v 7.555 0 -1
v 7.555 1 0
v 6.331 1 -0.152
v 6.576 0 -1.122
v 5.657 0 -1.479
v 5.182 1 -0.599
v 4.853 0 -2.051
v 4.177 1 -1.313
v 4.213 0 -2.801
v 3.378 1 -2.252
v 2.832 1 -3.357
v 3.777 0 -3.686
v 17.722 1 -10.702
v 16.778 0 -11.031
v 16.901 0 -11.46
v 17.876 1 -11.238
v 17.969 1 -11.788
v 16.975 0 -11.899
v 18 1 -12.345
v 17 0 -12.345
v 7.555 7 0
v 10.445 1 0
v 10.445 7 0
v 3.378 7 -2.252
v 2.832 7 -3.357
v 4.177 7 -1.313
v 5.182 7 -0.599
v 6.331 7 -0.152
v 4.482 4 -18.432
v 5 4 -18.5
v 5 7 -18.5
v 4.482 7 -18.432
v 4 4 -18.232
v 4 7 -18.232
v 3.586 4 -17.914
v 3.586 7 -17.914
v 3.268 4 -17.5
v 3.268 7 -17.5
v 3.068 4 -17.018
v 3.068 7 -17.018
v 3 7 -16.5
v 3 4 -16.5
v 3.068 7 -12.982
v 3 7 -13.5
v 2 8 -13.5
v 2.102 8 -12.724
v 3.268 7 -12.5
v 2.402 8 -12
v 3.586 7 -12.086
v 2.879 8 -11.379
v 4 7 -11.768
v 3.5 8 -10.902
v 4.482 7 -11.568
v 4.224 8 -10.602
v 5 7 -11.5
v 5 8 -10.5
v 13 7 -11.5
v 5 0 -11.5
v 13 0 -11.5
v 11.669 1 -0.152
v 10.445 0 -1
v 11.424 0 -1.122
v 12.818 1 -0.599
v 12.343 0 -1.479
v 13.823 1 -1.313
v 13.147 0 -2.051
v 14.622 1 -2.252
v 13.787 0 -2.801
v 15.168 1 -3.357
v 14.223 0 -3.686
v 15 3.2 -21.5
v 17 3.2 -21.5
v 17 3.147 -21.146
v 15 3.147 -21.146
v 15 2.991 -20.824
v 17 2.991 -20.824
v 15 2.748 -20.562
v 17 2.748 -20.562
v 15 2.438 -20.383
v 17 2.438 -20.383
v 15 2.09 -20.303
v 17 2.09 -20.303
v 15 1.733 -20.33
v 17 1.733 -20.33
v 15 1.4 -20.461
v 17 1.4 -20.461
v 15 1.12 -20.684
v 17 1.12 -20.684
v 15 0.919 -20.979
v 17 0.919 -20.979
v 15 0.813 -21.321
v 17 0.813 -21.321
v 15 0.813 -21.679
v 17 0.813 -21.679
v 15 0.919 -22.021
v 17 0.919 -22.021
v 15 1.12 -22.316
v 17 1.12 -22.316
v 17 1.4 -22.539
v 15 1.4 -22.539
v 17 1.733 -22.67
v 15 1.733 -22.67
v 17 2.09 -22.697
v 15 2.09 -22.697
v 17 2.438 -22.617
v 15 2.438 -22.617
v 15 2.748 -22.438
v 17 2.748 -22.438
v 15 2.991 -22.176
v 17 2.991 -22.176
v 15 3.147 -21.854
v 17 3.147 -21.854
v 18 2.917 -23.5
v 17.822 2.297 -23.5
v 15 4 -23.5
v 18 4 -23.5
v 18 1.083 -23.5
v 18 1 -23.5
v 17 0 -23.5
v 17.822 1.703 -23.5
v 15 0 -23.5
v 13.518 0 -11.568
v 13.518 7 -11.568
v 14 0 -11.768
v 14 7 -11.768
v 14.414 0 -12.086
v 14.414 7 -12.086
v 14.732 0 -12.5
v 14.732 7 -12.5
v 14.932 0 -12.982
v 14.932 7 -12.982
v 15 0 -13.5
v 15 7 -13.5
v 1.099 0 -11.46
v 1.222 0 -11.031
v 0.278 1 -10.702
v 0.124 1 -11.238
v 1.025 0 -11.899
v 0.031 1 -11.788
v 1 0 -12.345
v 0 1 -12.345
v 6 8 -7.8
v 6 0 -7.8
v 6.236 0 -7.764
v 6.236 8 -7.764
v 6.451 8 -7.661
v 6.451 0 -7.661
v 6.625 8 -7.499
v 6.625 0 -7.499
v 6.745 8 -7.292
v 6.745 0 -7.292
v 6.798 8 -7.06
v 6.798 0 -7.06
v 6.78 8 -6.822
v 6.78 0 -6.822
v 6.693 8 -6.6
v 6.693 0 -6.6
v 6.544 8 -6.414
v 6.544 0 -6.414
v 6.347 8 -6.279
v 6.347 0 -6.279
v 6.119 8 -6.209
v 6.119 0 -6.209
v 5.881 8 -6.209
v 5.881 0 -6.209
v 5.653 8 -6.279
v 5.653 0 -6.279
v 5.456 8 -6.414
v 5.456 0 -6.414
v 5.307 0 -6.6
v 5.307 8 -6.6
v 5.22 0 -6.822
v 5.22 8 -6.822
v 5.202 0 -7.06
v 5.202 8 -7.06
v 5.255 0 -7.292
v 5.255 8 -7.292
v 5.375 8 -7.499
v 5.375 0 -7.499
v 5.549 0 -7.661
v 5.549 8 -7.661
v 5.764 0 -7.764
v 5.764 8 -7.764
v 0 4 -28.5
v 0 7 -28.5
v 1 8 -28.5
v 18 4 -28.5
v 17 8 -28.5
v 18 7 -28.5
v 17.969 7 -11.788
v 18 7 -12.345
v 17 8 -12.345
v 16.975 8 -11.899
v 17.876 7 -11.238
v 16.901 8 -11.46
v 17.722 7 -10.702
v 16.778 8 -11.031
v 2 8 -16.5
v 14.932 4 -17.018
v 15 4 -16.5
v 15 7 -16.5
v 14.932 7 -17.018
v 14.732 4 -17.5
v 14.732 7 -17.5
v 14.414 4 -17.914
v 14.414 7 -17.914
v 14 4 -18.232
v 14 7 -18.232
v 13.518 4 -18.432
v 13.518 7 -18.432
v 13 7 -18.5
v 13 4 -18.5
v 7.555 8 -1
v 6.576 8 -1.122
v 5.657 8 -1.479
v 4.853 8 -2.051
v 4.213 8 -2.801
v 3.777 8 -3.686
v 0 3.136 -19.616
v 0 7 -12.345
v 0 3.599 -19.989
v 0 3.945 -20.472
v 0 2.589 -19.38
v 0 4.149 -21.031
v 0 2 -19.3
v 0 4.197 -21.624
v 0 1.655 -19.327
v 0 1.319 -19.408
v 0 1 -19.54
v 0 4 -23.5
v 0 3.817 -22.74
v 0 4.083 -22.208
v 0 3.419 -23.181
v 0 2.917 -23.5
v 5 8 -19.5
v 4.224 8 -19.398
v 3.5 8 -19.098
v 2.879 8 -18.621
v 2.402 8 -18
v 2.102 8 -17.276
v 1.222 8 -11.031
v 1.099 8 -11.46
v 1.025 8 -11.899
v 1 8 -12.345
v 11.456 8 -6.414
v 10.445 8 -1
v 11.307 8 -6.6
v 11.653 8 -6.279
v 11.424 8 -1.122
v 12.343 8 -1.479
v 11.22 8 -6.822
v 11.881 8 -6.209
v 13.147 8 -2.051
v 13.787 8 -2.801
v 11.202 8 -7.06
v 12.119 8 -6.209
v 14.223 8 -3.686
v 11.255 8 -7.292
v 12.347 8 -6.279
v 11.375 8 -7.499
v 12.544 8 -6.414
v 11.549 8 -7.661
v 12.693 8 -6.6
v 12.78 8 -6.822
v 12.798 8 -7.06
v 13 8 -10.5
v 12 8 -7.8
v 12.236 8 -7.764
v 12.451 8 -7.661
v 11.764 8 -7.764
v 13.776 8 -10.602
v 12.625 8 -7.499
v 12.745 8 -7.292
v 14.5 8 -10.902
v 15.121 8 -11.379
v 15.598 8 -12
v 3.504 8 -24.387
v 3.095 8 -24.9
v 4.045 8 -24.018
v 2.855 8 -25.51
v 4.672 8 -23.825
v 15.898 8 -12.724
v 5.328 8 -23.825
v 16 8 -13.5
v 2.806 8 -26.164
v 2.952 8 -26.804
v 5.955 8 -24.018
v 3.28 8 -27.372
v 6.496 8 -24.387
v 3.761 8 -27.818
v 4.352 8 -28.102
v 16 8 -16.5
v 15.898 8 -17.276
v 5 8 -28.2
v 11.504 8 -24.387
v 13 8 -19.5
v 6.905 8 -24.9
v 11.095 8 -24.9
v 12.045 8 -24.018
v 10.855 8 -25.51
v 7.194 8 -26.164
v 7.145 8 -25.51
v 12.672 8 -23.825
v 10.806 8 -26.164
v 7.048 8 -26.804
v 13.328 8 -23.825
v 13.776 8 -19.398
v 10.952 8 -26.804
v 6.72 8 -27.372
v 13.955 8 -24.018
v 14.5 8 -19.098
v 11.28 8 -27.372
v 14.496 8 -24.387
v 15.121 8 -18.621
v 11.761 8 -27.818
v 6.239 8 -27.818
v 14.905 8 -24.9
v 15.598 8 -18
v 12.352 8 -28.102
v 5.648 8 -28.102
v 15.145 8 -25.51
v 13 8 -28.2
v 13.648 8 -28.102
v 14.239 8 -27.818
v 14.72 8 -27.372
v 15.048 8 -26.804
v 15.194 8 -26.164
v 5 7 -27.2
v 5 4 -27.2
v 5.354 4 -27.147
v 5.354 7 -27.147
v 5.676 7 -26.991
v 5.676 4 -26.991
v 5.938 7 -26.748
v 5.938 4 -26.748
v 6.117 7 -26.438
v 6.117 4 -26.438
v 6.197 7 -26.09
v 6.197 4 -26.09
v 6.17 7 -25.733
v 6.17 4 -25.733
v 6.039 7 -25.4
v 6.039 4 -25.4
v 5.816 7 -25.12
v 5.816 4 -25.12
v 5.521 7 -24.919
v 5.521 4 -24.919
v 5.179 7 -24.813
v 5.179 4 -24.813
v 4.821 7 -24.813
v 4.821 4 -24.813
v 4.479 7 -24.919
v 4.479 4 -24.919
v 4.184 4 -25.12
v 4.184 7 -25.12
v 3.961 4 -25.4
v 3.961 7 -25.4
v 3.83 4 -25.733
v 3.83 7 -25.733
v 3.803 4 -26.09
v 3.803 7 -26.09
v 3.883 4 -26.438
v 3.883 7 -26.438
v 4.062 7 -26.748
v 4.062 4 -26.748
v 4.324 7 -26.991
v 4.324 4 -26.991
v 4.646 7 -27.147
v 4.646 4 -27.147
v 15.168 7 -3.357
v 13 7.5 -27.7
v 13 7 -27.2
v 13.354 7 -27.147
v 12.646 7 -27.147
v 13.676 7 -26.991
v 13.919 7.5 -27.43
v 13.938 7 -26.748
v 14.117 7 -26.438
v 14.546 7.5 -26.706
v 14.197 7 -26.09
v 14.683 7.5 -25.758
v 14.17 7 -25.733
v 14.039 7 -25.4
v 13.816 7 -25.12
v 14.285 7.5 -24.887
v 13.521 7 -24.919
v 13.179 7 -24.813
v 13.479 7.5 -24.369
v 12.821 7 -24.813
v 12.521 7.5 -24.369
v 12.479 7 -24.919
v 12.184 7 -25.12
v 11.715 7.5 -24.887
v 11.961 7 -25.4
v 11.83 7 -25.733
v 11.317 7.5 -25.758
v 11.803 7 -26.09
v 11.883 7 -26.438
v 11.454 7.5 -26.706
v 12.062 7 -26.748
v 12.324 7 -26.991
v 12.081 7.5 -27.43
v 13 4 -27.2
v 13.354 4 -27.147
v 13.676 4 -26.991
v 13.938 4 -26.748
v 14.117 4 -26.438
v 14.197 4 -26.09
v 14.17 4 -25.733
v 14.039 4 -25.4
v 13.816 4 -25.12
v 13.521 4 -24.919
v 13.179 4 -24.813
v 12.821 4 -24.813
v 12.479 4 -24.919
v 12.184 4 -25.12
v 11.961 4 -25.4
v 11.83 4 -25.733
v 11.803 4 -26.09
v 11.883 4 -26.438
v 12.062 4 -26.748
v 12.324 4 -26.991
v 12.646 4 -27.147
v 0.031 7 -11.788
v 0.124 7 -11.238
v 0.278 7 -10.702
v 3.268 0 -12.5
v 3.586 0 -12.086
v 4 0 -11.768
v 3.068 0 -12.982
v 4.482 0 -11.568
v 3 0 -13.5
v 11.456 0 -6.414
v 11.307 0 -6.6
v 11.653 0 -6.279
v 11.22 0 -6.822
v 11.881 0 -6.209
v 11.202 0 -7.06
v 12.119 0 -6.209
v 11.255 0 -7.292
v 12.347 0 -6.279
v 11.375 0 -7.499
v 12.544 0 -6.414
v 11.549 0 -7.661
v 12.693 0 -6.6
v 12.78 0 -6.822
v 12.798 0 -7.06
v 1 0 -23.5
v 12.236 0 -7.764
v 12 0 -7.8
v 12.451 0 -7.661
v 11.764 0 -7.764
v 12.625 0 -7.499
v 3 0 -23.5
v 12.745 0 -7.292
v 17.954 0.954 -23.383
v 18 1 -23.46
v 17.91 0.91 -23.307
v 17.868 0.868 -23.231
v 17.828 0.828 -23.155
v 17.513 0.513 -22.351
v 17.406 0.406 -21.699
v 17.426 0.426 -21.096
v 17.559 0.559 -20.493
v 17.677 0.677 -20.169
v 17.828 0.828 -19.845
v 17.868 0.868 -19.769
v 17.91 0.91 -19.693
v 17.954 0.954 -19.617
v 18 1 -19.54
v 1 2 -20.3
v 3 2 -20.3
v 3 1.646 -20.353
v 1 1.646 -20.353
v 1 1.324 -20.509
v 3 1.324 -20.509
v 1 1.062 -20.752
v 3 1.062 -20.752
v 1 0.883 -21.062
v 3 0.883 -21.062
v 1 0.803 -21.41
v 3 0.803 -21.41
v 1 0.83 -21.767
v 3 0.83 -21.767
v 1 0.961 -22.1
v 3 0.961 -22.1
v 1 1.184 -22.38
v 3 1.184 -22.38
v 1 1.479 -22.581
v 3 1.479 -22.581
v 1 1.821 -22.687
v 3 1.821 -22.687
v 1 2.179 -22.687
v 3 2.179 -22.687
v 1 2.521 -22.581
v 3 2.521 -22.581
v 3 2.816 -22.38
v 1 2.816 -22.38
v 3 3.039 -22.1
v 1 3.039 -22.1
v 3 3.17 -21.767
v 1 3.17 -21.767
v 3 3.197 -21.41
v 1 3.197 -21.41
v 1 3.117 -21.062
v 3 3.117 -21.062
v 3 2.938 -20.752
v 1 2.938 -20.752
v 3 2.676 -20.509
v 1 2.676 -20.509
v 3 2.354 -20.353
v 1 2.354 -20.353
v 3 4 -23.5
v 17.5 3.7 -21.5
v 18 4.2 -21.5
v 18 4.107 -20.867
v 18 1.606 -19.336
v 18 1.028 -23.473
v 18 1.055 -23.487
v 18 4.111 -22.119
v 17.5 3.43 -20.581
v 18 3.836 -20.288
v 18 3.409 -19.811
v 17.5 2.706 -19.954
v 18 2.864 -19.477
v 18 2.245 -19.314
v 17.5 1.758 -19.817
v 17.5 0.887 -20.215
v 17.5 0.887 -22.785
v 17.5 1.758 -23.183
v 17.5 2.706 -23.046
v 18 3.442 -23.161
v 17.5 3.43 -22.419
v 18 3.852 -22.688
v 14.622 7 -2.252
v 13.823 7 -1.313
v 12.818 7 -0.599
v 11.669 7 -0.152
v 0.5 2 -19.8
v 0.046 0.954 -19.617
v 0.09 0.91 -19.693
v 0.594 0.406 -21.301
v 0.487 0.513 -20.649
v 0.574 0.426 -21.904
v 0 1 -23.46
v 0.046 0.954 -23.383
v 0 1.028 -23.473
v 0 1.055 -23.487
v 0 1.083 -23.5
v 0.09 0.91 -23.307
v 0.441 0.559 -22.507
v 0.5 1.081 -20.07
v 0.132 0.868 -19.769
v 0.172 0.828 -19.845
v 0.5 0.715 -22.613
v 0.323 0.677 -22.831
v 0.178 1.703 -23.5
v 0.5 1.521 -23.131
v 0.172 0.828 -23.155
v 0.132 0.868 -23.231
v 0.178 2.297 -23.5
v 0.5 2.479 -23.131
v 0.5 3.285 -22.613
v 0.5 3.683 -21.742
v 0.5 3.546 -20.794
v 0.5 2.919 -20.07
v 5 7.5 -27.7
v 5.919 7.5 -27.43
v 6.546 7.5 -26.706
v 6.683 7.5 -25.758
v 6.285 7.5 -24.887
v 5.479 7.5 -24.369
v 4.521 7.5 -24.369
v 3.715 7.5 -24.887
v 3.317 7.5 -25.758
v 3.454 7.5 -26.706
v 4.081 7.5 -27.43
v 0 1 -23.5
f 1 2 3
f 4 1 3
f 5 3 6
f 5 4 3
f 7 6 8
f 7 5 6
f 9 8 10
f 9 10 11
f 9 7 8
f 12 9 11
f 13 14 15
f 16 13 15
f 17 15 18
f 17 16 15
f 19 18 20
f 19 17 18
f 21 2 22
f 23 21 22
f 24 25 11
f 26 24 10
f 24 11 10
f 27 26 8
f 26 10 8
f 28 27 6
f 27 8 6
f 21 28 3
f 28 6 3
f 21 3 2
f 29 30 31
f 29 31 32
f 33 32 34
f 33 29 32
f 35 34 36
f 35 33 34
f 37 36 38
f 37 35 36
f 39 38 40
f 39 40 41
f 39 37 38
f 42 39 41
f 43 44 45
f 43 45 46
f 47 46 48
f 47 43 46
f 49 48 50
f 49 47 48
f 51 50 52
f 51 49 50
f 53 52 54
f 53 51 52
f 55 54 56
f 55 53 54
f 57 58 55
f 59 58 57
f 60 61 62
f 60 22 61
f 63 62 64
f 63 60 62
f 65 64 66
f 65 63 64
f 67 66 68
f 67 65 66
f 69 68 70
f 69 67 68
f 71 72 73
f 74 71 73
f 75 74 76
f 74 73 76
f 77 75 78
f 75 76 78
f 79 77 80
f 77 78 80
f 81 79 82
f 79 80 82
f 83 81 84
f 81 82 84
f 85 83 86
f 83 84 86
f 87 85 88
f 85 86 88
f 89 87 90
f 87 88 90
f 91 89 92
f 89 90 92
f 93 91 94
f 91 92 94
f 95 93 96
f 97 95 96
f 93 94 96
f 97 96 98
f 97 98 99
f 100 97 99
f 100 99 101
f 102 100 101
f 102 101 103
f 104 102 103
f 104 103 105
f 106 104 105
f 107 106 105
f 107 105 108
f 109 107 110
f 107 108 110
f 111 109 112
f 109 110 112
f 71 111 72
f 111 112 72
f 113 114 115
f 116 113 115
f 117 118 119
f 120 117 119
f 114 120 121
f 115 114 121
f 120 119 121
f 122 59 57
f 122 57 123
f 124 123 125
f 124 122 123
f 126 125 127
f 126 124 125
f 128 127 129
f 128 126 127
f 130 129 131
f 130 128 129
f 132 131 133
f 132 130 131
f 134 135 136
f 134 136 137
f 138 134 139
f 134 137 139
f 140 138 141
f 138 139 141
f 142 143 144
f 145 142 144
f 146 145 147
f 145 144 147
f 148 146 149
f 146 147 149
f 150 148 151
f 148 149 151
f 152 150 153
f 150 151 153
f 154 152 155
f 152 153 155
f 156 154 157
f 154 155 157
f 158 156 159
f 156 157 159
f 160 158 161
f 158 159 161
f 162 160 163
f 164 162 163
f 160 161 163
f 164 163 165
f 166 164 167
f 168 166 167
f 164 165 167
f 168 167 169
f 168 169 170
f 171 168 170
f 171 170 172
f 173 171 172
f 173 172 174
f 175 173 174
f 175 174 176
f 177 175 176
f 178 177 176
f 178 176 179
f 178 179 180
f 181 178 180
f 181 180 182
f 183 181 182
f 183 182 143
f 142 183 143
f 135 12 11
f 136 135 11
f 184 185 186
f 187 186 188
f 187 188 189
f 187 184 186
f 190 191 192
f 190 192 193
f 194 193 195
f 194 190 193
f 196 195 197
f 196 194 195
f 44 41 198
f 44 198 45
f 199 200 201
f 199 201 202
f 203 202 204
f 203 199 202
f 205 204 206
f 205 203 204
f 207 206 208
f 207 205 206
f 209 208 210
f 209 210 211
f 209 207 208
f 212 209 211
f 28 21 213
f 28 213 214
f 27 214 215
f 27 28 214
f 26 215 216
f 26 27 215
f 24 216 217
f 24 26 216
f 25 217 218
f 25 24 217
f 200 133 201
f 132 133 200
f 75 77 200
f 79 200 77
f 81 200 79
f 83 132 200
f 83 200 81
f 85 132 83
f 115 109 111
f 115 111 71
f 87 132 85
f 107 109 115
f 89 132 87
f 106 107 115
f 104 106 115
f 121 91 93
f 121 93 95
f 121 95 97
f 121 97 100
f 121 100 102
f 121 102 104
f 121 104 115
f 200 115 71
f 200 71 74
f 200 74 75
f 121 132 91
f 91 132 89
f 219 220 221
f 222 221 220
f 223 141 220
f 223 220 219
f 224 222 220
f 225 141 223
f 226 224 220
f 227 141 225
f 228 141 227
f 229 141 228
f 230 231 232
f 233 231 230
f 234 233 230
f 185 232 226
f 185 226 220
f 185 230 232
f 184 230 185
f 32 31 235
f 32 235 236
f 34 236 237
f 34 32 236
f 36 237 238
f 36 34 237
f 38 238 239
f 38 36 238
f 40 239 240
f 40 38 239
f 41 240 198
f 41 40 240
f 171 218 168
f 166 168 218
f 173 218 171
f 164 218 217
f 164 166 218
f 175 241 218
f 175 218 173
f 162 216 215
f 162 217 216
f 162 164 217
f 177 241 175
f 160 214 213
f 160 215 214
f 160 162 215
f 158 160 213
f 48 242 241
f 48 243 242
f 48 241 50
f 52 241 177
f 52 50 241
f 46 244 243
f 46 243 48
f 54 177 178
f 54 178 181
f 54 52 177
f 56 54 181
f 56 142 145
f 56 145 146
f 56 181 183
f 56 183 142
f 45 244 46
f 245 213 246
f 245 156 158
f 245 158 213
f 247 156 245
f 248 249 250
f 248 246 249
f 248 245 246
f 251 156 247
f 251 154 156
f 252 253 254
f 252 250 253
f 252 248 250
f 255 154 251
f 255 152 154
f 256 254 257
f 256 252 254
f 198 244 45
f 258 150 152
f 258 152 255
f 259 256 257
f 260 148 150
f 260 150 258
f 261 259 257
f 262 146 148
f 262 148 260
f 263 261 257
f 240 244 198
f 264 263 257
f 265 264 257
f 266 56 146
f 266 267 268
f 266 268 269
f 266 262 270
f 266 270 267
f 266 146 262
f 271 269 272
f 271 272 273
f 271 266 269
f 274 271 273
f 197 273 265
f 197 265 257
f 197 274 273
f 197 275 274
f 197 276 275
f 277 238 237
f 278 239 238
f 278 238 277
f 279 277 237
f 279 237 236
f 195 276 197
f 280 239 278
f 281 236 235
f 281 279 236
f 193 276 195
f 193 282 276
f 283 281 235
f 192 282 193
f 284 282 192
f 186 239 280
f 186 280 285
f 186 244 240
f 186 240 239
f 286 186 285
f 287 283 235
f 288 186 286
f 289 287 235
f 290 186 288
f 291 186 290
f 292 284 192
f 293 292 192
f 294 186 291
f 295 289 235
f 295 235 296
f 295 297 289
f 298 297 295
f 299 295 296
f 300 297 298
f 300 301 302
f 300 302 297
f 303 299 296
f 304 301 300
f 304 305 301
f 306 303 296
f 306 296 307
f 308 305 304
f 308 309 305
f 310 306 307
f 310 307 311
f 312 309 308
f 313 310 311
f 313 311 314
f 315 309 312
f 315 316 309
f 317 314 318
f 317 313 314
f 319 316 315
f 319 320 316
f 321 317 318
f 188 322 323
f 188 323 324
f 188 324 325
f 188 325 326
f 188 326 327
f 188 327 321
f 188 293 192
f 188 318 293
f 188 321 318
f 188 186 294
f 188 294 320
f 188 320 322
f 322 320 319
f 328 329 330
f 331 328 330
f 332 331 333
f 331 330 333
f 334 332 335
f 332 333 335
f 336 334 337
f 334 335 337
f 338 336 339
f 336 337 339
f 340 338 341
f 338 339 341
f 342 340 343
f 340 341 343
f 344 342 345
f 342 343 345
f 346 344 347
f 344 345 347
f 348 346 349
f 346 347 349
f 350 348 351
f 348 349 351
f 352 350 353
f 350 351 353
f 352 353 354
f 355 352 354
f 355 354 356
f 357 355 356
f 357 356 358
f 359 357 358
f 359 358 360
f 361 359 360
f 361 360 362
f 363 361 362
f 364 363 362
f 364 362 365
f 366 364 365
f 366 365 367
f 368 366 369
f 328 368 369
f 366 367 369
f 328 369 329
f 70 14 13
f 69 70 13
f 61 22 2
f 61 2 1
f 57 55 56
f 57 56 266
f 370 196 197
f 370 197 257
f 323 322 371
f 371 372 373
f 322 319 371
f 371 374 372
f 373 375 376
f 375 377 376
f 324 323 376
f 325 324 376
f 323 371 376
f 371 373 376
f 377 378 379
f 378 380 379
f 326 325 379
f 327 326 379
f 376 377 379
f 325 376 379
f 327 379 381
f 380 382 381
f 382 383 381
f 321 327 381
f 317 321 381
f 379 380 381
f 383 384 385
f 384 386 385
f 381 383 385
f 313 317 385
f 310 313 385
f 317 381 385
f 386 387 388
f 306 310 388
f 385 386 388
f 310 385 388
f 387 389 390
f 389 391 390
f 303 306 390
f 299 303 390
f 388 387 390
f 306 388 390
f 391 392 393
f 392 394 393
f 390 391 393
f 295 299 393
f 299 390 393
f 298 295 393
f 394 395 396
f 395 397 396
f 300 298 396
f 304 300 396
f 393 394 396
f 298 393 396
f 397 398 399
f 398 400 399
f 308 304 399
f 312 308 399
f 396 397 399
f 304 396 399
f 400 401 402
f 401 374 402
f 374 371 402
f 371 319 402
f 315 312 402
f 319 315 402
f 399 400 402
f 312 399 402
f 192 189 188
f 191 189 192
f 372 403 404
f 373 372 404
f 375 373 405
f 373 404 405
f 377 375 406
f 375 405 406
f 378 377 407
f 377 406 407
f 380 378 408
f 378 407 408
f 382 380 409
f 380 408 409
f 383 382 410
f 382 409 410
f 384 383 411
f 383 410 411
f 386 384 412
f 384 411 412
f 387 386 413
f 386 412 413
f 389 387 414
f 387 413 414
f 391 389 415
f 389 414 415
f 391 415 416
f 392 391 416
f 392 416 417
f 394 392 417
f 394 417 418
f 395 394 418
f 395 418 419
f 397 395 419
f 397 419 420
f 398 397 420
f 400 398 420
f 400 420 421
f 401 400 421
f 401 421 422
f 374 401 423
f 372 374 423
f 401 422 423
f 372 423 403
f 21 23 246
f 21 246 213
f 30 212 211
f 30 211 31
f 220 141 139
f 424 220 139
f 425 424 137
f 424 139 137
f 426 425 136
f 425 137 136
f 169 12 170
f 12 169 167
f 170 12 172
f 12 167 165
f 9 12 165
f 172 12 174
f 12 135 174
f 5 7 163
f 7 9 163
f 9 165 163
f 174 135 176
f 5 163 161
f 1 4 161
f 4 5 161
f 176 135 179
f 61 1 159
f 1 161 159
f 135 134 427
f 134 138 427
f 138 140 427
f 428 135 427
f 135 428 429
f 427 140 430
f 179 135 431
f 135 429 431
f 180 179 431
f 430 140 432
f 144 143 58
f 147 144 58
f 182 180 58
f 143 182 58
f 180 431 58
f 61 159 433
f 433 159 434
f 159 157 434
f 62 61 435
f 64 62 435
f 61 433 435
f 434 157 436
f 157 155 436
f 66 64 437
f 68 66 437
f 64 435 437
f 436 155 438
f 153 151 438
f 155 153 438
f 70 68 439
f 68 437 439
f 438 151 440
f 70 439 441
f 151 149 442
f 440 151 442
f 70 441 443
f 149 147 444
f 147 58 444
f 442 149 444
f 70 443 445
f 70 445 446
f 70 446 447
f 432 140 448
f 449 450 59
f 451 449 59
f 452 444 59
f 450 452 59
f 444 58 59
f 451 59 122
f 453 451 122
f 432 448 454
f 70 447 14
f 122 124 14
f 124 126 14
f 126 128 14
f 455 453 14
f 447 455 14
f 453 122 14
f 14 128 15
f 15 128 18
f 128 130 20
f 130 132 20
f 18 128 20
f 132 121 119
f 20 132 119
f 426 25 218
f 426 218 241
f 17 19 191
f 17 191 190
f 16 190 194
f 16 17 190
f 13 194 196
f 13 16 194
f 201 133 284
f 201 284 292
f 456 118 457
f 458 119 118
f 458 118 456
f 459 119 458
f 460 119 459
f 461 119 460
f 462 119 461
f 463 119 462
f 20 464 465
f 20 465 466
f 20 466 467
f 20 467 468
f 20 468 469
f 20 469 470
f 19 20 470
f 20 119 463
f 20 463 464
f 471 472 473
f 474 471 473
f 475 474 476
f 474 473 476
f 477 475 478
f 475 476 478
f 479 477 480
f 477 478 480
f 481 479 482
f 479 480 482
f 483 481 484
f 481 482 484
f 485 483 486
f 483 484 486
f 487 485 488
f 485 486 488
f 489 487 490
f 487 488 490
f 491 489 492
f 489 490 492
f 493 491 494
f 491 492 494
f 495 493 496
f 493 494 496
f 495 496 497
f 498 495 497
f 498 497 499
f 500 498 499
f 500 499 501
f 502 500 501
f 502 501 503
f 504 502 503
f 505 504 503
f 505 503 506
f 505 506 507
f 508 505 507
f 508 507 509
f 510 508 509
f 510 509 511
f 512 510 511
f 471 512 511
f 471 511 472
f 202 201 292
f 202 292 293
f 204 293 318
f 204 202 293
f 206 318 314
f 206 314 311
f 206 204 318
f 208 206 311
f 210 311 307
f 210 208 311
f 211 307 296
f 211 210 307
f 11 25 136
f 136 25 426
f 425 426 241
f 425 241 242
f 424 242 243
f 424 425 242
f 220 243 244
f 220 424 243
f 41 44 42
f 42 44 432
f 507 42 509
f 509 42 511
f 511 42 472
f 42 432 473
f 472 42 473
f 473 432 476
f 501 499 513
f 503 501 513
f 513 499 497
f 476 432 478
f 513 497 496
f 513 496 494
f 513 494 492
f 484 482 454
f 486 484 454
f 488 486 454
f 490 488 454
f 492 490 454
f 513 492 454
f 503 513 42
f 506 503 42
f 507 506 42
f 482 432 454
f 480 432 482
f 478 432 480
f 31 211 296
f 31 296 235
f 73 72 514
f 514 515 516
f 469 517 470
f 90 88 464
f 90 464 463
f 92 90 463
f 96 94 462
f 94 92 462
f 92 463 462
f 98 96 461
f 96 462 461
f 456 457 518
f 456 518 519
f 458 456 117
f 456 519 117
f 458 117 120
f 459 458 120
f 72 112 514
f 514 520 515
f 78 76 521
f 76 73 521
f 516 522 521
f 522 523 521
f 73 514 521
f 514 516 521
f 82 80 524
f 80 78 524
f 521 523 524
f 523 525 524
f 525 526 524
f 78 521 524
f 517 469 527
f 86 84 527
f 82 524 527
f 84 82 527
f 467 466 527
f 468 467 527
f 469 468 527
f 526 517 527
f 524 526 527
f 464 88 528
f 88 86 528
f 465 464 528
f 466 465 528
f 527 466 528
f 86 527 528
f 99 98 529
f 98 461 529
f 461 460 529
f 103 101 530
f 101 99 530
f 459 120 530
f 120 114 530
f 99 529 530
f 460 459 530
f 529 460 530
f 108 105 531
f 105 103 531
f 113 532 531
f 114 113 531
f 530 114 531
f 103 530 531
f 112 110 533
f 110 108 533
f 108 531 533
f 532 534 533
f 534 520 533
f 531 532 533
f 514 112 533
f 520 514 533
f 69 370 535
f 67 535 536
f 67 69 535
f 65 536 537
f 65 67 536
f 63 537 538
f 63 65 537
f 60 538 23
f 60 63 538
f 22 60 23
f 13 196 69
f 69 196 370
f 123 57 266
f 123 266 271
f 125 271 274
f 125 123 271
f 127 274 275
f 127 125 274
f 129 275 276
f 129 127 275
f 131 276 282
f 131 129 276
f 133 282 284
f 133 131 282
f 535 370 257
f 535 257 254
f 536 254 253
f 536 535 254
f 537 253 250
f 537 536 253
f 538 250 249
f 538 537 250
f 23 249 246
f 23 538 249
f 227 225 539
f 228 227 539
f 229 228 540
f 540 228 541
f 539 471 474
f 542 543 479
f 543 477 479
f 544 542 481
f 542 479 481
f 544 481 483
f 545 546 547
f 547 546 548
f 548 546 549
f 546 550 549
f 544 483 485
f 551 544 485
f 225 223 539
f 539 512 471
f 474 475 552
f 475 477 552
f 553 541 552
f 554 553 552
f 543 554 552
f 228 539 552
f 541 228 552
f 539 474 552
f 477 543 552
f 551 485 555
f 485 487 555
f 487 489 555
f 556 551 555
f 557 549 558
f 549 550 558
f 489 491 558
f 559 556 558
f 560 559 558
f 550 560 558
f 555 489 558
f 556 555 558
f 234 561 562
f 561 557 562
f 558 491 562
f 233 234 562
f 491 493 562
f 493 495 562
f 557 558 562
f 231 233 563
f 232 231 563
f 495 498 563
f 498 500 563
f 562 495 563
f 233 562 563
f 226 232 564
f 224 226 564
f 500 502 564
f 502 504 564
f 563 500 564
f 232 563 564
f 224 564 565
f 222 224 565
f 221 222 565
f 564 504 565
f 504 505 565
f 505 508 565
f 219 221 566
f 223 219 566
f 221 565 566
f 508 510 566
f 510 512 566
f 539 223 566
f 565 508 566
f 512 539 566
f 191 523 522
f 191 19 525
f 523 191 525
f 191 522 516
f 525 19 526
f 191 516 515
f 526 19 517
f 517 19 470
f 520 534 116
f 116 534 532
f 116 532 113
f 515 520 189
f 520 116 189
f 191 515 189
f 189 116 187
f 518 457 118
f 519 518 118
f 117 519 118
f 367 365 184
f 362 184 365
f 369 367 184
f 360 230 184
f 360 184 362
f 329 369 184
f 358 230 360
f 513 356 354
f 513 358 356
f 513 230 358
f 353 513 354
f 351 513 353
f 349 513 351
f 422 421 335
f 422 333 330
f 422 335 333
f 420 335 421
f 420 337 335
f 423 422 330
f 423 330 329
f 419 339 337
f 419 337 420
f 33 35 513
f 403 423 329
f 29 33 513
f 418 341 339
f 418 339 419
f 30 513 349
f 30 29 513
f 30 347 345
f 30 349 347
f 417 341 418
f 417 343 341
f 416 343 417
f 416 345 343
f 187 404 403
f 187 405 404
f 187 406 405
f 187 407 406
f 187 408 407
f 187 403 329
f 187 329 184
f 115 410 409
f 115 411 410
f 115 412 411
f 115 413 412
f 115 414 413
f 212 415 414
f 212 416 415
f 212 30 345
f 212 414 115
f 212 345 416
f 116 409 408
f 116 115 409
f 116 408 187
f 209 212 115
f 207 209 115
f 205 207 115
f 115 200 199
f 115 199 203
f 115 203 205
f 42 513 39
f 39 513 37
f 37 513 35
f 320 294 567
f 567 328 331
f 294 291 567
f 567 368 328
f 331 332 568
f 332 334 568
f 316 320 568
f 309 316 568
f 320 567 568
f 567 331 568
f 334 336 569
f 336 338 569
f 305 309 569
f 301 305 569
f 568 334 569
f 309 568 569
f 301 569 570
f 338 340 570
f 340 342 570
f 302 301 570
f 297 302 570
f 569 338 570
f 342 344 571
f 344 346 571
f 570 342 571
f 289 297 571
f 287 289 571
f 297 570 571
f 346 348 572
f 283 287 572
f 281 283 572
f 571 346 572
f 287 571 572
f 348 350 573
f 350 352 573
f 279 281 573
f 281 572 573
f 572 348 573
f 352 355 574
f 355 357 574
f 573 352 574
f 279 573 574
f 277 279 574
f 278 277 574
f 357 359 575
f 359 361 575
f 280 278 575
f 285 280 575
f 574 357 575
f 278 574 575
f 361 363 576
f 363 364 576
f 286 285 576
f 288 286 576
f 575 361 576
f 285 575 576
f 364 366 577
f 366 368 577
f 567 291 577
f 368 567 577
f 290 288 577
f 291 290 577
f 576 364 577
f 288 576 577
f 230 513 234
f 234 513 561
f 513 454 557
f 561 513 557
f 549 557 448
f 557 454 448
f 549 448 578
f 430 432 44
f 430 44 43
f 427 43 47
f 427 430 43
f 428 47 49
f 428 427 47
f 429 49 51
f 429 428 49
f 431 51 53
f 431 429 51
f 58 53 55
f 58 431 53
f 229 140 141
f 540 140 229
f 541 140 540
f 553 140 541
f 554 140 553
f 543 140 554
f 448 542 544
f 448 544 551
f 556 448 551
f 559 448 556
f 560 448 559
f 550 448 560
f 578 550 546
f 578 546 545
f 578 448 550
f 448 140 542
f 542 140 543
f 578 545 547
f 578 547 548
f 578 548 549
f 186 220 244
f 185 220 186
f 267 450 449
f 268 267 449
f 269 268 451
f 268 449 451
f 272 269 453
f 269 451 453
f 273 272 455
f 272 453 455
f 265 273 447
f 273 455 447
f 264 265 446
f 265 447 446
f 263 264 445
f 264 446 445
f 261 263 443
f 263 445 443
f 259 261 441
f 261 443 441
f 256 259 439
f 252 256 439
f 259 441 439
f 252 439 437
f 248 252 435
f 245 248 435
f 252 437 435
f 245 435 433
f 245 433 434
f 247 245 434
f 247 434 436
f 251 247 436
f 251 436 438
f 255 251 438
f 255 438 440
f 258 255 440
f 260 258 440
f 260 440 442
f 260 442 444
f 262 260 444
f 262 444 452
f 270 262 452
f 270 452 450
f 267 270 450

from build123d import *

# Parameters (mm, degrees)
ESBO_O1_W                                            = 18
ESBO_O1_H                                            = 28.5
RESSALTO_EXTRUS_O1_DEPTH                             = 8
ESCAREADO_PARA_PARAFUSO_COM_CABE_A_ESCAR_D           = 2.4
ESCAREADO_PARA_PARAFUSO_COM_CABE_A_ESCAR_CSINK_D     = 4.4
ESCAREADO_PARA_PARAFUSO_COM_CABE_A_ESCAR_CSINK_ANGLE = 90
CORTE_EXTRUS_O1_DEPTH                                = 4
ESCAREADO_PARA_PARAFUSO_COM_CABE_A_E_3_D             = 2.4
ESCAREADO_PARA_PARAFUSO_COM_CABE_A_E_3_CSINK_D       = 4.4
ESCAREADO_PARA_PARAFUSO_COM_CABE_A_E_3_CSINK_ANGLE   = 90
CORTE_EXTRUS_O2_DEPTH                                = 35.644624403
FILETE1_R                                            = 5
CHANFRO1_SIZE                                        = 1
CHANFRO2_SIZE                                        = 1
BROCA_DE_ROSQUEAR_PARA_TARRAXA_DE_M21_D              = 1.6


# Read off the part's stored shape, not the designer's step: Escareado para parafuso com cabeça escareada chata de M21
with BuildPart() as part:
    # Esboço1 → Ressalto-extrusão1 (new body)
    with BuildSketch(Plane(origin=(0, 0, 0), x_dir=(1, 0, 0), z_dir=(0, 1, 0))):
        with Locations((9, 14.25)):
            Rectangle(ESBO_O1_W, ESBO_O1_H)
        with BuildLine():
            Line((5, 11.5), (13, 11.5))
            ThreePointArc((13, 11.5), (14.414213562, 12.085786438), (15, 13.5))
            Line((15, 13.5), (15, 16.5))
            ThreePointArc((15, 16.5), (14.414213562, 17.914213562), (13, 18.5))
            Line((13, 18.5), (5, 18.5))
            ThreePointArc((5, 18.5), (3.585786438, 17.914213562), (3, 16.5))
            Line((3, 16.5), (3, 13.5))
            ThreePointArc((3, 13.5), (3.585786438, 12.085786438), (5, 11.5))
        make_face(mode=Mode.SUBTRACT)
    extrude(amount=RESSALTO_EXTRUS_O1_DEPTH)

    # Escareado para parafuso com cabe_a escar (through all)
    with Locations(Plane(origin=(5, 8, -26), x_dir=(0, 0, 1), z_dir=(0, 1, 0))):
        with Locations((0, 0), (0, 8)):
            CounterSinkHole(ESCAREADO_PARA_PARAFUSO_COM_CABE_A_ESCAR_D / 2, ESCAREADO_PARA_PARAFUSO_COM_CABE_A_ESCAR_CSINK_D / 2, counter_sink_angle=ESCAREADO_PARA_PARAFUSO_COM_CABE_A_ESCAR_CSINK_ANGLE)

    # Esboço10 → Corte-extrusão1 (cut)
    with BuildSketch(Plane.XZ):
        Polygon((0, -28.5), (18, -28.5), (18, -23.5), (15, -23.5), (15, -15), (3, -15), (3, -23.5), (0, -23.5), align=None)
    extrude(amount=-CORTE_EXTRUS_O1_DEPTH, mode=Mode.SUBTRACT)

    # Escareado para parafuso com cabe_a e 2 o → Escareado para parafuso com cabe_a e 2 (revolve, cut)
    with BuildSketch(Plane(origin=(0, 2, -21.5), x_dir=(0, 1, 0), z_dir=(0, 0, -1))):
        Polygon((2.2, 18), (0, 18), (0, 15), (1.2, 15), (1.2, 17), align=None)
    revolve(axis=Axis((0, 2, -21.5), (1, 0, 0)), mode=Mode.SUBTRACT)

    # Escareado para parafuso com cabe_a e 3 (through all)
    with Locations(Plane(origin=(0, 2, -21.5), x_dir=(0, 0, -1), z_dir=(-1, 0, 0))):
        with Locations((0, 0)):
            CounterSinkHole(ESCAREADO_PARA_PARAFUSO_COM_CABE_A_E_3_D / 2, ESCAREADO_PARA_PARAFUSO_COM_CABE_A_E_3_CSINK_D / 2, counter_sink_angle=ESCAREADO_PARA_PARAFUSO_COM_CABE_A_E_3_CSINK_ANGLE)

    # Esboço15 → Corte-extrusão2 (cut, through all)
    with BuildSketch(Plane(origin=(0, 8, 0), x_dir=(1, 0, 0), z_dir=(0, 1, 0))):
        Polygon((0, 0), (4, 0), (0, 11.5), align=None)
        Polygon((18, 0), (18, 11.5), (14, 0), align=None)
    extrude(amount=-CORTE_EXTRUS_O2_DEPTH, mode=Mode.SUBTRACT)

    # Filete1
    filete1_edges = [part.edges().sort_by_distance(p)[0] for p in [
        (0, 4, -11.5),
        (4, 4, 0),
        (14, 4, 0),
        (18, 4, -11.5),
    ]]
    fillet(filete1_edges, radius=FILETE1_R)

    # Chanfro1
    chanfro1_edges = [part.edges().sort_by_distance(p)[0] for p in [
        (16.445137101, 8, -7.029769164),
        (0, 8, -20.422372289),
        (1.554862899, 8, -7.029769164),
        (9, 8, 0),
        (18, 8, -20.422372289),
        (13.342458661, 8, -0.924891681),
        (0.069867146, 8, -11.511803979),
        (4.657541339, 8, -0.924891681),
        (17.930132854, 8, -11.511803979),
        (3.585786438, 8, -12.085786438),
        (14.414213562, 8, -17.914213562),
        (9, 8, -18.5),
        (3.585786438, 8, -17.914213562),
        (3, 8, -15),
        (9, 8, -11.5),
        (14.414213562, 8, -12.085786438),
        (15, 8, -15),
    ]]
    chamfer(chanfro1_edges, length=CHANFRO1_SIZE)

    # Chanfro2
    # the kernel refuses this chamfer: 1 mm, written as the material it takes off along each edge
    with BuildSketch(Plane(origin=(0, 0, -26.071682988), x_dir=(0.9996219169112968, -0.027495876610586372, 0), z_dir=(0, 0, 1)), Plane(origin=(18, 0, -19.844832151), x_dir=(-0.9996219169112968, -0.02749587661058639, 0), z_dir=(0, 0, -1))) as chanfro2_piece_1:
        Polygon((CHANFRO2_SIZE * 0.999621916911, CHANFRO2_SIZE * 0.0274958766106), (-CHANFRO2_SIZE * 0.0274958766106, CHANFRO2_SIZE * 0.999621916911), (0, 0), align=None)
    extrude(amount=6.226850837, mode=Mode.SUBTRACT)
    with BuildSketch(Plane(origin=(17.722483984, 0, -10.702141453), x_dir=(-0.94413969843999, -0.02749587661058639, -0.32839641684869236), z_dir=(-0.3285206249412729, 0, 0.944496796706159)), Plane(origin=(2.832209783, 0, -3.357396875), x_dir=(0.9441396984399901, -0.02749587661058552, -0.32839641684869225), z_dir=(-0.32852062494127277, 0, -0.9444967967061592))) as chanfro2_piece_2:
        Polygon((CHANFRO2_SIZE * 0.999621916911, -CHANFRO2_SIZE * 0.0274958766106), (-CHANFRO2_SIZE * 0.0274958766106, -CHANFRO2_SIZE * 0.999621916911), (0, 0), align=None)
    extrude(amount=7.776357318, mode=Mode.SUBTRACT)
    with BuildSketch(Plane(origin=(18, 0, -12.344744577), x_dir=(-0.9996219169112968, -0.02749587661058639, 0), z_dir=(0, 0, -1)), Plane(origin=(0, 0, -23.155167849), x_dir=(0.9996219169112968, -0.027495876610586372, 0), z_dir=(0, 0, 1))) as chanfro2_piece_3:
        Polygon((CHANFRO2_SIZE * 0.999621916911, CHANFRO2_SIZE * 0.0274958766106), (-CHANFRO2_SIZE * 0.0274958766106, CHANFRO2_SIZE * 0.999621916911), (0, 0), align=None)
    extrude(amount=10.810423272, mode=Mode.SUBTRACT)
    with BuildSketch(Plane(origin=(7.554693766, 0, 0), x_dir=(0, 0.9996219169112968, 0.027495876610586372), z_dir=(1, 0, 0))) as chanfro2_piece_4:
        Polygon((CHANFRO2_SIZE * 0.999621916911, -CHANFRO2_SIZE * 0.0274958766106), (-CHANFRO2_SIZE * 0.0274958766106, -CHANFRO2_SIZE * 0.999621916911), (0, 0), align=None)
    extrude(amount=2.890612468, mode=Mode.SUBTRACT)
    with BuildSketch(Plane(origin=(10.445306234, 0, -5), x_dir=(0, 0, 1), z_dir=(-1, 0, 0))) as chanfro2_piece_5:
        Polygon((5 - CHANFRO2_SIZE, 0), (5, CHANFRO2_SIZE), (5, 0), align=None)
    revolve(axis=Axis((10.445306234, 0, -5), (0, 1, 0)), revolution_arc=70.820991974, mode=Mode.SUBTRACT)
    with BuildSketch(Plane(origin=(5, 0, -12.344744577), x_dir=(-0.944496796706159, 0, 0.32852062494127277), z_dir=(0.32852062494127277, 0, 0.944496796706159))) as chanfro2_piece_6:
        Polygon((5 - CHANFRO2_SIZE, 0), (5, -CHANFRO2_SIZE), (5, 0), align=None)
    revolve(axis=Axis((5, 0, -12.344744577), (0, -1, 0)), revolution_arc=19.179008026, mode=Mode.SUBTRACT)
    with BuildSketch(Plane(origin=(7.554693766, 0, -5), x_dir=(0, 0, 1), z_dir=(1, 0, 0))) as chanfro2_piece_7:
        Polygon((5, -CHANFRO2_SIZE), (5 - CHANFRO2_SIZE, 0), (5, 0), align=None)
    revolve(axis=Axis((7.554693766, 0, -5), (0, -1, 0)), revolution_arc=70.820991974, mode=Mode.SUBTRACT)
    with BuildSketch(Plane(origin=(13, 0, -12.344744577), x_dir=(0.9444967967061589, 0, 0.3285206249412729), z_dir=(-0.3285206249412729, 0, 0.9444967967061589))) as chanfro2_piece_8:
        Polygon((5 - CHANFRO2_SIZE, 0), (5, CHANFRO2_SIZE), (5, 0), align=None)
    revolve(axis=Axis((13, 0, -12.344744577), (0, 1, 0)), revolution_arc=19.179008026, mode=Mode.SUBTRACT)

    # Broca de rosquear para tarraxa de M21 (through all)
    with Locations(Plane(origin=(6, 8, -7), x_dir=(0, 0, 1), z_dir=(0, 1, 0))):
        with Locations((0, 0), (0, 6)):
            Hole(BROCA_DE_ROSQUEAR_PARA_TARRAXA_DE_M21_D / 2)


solid = part.part
